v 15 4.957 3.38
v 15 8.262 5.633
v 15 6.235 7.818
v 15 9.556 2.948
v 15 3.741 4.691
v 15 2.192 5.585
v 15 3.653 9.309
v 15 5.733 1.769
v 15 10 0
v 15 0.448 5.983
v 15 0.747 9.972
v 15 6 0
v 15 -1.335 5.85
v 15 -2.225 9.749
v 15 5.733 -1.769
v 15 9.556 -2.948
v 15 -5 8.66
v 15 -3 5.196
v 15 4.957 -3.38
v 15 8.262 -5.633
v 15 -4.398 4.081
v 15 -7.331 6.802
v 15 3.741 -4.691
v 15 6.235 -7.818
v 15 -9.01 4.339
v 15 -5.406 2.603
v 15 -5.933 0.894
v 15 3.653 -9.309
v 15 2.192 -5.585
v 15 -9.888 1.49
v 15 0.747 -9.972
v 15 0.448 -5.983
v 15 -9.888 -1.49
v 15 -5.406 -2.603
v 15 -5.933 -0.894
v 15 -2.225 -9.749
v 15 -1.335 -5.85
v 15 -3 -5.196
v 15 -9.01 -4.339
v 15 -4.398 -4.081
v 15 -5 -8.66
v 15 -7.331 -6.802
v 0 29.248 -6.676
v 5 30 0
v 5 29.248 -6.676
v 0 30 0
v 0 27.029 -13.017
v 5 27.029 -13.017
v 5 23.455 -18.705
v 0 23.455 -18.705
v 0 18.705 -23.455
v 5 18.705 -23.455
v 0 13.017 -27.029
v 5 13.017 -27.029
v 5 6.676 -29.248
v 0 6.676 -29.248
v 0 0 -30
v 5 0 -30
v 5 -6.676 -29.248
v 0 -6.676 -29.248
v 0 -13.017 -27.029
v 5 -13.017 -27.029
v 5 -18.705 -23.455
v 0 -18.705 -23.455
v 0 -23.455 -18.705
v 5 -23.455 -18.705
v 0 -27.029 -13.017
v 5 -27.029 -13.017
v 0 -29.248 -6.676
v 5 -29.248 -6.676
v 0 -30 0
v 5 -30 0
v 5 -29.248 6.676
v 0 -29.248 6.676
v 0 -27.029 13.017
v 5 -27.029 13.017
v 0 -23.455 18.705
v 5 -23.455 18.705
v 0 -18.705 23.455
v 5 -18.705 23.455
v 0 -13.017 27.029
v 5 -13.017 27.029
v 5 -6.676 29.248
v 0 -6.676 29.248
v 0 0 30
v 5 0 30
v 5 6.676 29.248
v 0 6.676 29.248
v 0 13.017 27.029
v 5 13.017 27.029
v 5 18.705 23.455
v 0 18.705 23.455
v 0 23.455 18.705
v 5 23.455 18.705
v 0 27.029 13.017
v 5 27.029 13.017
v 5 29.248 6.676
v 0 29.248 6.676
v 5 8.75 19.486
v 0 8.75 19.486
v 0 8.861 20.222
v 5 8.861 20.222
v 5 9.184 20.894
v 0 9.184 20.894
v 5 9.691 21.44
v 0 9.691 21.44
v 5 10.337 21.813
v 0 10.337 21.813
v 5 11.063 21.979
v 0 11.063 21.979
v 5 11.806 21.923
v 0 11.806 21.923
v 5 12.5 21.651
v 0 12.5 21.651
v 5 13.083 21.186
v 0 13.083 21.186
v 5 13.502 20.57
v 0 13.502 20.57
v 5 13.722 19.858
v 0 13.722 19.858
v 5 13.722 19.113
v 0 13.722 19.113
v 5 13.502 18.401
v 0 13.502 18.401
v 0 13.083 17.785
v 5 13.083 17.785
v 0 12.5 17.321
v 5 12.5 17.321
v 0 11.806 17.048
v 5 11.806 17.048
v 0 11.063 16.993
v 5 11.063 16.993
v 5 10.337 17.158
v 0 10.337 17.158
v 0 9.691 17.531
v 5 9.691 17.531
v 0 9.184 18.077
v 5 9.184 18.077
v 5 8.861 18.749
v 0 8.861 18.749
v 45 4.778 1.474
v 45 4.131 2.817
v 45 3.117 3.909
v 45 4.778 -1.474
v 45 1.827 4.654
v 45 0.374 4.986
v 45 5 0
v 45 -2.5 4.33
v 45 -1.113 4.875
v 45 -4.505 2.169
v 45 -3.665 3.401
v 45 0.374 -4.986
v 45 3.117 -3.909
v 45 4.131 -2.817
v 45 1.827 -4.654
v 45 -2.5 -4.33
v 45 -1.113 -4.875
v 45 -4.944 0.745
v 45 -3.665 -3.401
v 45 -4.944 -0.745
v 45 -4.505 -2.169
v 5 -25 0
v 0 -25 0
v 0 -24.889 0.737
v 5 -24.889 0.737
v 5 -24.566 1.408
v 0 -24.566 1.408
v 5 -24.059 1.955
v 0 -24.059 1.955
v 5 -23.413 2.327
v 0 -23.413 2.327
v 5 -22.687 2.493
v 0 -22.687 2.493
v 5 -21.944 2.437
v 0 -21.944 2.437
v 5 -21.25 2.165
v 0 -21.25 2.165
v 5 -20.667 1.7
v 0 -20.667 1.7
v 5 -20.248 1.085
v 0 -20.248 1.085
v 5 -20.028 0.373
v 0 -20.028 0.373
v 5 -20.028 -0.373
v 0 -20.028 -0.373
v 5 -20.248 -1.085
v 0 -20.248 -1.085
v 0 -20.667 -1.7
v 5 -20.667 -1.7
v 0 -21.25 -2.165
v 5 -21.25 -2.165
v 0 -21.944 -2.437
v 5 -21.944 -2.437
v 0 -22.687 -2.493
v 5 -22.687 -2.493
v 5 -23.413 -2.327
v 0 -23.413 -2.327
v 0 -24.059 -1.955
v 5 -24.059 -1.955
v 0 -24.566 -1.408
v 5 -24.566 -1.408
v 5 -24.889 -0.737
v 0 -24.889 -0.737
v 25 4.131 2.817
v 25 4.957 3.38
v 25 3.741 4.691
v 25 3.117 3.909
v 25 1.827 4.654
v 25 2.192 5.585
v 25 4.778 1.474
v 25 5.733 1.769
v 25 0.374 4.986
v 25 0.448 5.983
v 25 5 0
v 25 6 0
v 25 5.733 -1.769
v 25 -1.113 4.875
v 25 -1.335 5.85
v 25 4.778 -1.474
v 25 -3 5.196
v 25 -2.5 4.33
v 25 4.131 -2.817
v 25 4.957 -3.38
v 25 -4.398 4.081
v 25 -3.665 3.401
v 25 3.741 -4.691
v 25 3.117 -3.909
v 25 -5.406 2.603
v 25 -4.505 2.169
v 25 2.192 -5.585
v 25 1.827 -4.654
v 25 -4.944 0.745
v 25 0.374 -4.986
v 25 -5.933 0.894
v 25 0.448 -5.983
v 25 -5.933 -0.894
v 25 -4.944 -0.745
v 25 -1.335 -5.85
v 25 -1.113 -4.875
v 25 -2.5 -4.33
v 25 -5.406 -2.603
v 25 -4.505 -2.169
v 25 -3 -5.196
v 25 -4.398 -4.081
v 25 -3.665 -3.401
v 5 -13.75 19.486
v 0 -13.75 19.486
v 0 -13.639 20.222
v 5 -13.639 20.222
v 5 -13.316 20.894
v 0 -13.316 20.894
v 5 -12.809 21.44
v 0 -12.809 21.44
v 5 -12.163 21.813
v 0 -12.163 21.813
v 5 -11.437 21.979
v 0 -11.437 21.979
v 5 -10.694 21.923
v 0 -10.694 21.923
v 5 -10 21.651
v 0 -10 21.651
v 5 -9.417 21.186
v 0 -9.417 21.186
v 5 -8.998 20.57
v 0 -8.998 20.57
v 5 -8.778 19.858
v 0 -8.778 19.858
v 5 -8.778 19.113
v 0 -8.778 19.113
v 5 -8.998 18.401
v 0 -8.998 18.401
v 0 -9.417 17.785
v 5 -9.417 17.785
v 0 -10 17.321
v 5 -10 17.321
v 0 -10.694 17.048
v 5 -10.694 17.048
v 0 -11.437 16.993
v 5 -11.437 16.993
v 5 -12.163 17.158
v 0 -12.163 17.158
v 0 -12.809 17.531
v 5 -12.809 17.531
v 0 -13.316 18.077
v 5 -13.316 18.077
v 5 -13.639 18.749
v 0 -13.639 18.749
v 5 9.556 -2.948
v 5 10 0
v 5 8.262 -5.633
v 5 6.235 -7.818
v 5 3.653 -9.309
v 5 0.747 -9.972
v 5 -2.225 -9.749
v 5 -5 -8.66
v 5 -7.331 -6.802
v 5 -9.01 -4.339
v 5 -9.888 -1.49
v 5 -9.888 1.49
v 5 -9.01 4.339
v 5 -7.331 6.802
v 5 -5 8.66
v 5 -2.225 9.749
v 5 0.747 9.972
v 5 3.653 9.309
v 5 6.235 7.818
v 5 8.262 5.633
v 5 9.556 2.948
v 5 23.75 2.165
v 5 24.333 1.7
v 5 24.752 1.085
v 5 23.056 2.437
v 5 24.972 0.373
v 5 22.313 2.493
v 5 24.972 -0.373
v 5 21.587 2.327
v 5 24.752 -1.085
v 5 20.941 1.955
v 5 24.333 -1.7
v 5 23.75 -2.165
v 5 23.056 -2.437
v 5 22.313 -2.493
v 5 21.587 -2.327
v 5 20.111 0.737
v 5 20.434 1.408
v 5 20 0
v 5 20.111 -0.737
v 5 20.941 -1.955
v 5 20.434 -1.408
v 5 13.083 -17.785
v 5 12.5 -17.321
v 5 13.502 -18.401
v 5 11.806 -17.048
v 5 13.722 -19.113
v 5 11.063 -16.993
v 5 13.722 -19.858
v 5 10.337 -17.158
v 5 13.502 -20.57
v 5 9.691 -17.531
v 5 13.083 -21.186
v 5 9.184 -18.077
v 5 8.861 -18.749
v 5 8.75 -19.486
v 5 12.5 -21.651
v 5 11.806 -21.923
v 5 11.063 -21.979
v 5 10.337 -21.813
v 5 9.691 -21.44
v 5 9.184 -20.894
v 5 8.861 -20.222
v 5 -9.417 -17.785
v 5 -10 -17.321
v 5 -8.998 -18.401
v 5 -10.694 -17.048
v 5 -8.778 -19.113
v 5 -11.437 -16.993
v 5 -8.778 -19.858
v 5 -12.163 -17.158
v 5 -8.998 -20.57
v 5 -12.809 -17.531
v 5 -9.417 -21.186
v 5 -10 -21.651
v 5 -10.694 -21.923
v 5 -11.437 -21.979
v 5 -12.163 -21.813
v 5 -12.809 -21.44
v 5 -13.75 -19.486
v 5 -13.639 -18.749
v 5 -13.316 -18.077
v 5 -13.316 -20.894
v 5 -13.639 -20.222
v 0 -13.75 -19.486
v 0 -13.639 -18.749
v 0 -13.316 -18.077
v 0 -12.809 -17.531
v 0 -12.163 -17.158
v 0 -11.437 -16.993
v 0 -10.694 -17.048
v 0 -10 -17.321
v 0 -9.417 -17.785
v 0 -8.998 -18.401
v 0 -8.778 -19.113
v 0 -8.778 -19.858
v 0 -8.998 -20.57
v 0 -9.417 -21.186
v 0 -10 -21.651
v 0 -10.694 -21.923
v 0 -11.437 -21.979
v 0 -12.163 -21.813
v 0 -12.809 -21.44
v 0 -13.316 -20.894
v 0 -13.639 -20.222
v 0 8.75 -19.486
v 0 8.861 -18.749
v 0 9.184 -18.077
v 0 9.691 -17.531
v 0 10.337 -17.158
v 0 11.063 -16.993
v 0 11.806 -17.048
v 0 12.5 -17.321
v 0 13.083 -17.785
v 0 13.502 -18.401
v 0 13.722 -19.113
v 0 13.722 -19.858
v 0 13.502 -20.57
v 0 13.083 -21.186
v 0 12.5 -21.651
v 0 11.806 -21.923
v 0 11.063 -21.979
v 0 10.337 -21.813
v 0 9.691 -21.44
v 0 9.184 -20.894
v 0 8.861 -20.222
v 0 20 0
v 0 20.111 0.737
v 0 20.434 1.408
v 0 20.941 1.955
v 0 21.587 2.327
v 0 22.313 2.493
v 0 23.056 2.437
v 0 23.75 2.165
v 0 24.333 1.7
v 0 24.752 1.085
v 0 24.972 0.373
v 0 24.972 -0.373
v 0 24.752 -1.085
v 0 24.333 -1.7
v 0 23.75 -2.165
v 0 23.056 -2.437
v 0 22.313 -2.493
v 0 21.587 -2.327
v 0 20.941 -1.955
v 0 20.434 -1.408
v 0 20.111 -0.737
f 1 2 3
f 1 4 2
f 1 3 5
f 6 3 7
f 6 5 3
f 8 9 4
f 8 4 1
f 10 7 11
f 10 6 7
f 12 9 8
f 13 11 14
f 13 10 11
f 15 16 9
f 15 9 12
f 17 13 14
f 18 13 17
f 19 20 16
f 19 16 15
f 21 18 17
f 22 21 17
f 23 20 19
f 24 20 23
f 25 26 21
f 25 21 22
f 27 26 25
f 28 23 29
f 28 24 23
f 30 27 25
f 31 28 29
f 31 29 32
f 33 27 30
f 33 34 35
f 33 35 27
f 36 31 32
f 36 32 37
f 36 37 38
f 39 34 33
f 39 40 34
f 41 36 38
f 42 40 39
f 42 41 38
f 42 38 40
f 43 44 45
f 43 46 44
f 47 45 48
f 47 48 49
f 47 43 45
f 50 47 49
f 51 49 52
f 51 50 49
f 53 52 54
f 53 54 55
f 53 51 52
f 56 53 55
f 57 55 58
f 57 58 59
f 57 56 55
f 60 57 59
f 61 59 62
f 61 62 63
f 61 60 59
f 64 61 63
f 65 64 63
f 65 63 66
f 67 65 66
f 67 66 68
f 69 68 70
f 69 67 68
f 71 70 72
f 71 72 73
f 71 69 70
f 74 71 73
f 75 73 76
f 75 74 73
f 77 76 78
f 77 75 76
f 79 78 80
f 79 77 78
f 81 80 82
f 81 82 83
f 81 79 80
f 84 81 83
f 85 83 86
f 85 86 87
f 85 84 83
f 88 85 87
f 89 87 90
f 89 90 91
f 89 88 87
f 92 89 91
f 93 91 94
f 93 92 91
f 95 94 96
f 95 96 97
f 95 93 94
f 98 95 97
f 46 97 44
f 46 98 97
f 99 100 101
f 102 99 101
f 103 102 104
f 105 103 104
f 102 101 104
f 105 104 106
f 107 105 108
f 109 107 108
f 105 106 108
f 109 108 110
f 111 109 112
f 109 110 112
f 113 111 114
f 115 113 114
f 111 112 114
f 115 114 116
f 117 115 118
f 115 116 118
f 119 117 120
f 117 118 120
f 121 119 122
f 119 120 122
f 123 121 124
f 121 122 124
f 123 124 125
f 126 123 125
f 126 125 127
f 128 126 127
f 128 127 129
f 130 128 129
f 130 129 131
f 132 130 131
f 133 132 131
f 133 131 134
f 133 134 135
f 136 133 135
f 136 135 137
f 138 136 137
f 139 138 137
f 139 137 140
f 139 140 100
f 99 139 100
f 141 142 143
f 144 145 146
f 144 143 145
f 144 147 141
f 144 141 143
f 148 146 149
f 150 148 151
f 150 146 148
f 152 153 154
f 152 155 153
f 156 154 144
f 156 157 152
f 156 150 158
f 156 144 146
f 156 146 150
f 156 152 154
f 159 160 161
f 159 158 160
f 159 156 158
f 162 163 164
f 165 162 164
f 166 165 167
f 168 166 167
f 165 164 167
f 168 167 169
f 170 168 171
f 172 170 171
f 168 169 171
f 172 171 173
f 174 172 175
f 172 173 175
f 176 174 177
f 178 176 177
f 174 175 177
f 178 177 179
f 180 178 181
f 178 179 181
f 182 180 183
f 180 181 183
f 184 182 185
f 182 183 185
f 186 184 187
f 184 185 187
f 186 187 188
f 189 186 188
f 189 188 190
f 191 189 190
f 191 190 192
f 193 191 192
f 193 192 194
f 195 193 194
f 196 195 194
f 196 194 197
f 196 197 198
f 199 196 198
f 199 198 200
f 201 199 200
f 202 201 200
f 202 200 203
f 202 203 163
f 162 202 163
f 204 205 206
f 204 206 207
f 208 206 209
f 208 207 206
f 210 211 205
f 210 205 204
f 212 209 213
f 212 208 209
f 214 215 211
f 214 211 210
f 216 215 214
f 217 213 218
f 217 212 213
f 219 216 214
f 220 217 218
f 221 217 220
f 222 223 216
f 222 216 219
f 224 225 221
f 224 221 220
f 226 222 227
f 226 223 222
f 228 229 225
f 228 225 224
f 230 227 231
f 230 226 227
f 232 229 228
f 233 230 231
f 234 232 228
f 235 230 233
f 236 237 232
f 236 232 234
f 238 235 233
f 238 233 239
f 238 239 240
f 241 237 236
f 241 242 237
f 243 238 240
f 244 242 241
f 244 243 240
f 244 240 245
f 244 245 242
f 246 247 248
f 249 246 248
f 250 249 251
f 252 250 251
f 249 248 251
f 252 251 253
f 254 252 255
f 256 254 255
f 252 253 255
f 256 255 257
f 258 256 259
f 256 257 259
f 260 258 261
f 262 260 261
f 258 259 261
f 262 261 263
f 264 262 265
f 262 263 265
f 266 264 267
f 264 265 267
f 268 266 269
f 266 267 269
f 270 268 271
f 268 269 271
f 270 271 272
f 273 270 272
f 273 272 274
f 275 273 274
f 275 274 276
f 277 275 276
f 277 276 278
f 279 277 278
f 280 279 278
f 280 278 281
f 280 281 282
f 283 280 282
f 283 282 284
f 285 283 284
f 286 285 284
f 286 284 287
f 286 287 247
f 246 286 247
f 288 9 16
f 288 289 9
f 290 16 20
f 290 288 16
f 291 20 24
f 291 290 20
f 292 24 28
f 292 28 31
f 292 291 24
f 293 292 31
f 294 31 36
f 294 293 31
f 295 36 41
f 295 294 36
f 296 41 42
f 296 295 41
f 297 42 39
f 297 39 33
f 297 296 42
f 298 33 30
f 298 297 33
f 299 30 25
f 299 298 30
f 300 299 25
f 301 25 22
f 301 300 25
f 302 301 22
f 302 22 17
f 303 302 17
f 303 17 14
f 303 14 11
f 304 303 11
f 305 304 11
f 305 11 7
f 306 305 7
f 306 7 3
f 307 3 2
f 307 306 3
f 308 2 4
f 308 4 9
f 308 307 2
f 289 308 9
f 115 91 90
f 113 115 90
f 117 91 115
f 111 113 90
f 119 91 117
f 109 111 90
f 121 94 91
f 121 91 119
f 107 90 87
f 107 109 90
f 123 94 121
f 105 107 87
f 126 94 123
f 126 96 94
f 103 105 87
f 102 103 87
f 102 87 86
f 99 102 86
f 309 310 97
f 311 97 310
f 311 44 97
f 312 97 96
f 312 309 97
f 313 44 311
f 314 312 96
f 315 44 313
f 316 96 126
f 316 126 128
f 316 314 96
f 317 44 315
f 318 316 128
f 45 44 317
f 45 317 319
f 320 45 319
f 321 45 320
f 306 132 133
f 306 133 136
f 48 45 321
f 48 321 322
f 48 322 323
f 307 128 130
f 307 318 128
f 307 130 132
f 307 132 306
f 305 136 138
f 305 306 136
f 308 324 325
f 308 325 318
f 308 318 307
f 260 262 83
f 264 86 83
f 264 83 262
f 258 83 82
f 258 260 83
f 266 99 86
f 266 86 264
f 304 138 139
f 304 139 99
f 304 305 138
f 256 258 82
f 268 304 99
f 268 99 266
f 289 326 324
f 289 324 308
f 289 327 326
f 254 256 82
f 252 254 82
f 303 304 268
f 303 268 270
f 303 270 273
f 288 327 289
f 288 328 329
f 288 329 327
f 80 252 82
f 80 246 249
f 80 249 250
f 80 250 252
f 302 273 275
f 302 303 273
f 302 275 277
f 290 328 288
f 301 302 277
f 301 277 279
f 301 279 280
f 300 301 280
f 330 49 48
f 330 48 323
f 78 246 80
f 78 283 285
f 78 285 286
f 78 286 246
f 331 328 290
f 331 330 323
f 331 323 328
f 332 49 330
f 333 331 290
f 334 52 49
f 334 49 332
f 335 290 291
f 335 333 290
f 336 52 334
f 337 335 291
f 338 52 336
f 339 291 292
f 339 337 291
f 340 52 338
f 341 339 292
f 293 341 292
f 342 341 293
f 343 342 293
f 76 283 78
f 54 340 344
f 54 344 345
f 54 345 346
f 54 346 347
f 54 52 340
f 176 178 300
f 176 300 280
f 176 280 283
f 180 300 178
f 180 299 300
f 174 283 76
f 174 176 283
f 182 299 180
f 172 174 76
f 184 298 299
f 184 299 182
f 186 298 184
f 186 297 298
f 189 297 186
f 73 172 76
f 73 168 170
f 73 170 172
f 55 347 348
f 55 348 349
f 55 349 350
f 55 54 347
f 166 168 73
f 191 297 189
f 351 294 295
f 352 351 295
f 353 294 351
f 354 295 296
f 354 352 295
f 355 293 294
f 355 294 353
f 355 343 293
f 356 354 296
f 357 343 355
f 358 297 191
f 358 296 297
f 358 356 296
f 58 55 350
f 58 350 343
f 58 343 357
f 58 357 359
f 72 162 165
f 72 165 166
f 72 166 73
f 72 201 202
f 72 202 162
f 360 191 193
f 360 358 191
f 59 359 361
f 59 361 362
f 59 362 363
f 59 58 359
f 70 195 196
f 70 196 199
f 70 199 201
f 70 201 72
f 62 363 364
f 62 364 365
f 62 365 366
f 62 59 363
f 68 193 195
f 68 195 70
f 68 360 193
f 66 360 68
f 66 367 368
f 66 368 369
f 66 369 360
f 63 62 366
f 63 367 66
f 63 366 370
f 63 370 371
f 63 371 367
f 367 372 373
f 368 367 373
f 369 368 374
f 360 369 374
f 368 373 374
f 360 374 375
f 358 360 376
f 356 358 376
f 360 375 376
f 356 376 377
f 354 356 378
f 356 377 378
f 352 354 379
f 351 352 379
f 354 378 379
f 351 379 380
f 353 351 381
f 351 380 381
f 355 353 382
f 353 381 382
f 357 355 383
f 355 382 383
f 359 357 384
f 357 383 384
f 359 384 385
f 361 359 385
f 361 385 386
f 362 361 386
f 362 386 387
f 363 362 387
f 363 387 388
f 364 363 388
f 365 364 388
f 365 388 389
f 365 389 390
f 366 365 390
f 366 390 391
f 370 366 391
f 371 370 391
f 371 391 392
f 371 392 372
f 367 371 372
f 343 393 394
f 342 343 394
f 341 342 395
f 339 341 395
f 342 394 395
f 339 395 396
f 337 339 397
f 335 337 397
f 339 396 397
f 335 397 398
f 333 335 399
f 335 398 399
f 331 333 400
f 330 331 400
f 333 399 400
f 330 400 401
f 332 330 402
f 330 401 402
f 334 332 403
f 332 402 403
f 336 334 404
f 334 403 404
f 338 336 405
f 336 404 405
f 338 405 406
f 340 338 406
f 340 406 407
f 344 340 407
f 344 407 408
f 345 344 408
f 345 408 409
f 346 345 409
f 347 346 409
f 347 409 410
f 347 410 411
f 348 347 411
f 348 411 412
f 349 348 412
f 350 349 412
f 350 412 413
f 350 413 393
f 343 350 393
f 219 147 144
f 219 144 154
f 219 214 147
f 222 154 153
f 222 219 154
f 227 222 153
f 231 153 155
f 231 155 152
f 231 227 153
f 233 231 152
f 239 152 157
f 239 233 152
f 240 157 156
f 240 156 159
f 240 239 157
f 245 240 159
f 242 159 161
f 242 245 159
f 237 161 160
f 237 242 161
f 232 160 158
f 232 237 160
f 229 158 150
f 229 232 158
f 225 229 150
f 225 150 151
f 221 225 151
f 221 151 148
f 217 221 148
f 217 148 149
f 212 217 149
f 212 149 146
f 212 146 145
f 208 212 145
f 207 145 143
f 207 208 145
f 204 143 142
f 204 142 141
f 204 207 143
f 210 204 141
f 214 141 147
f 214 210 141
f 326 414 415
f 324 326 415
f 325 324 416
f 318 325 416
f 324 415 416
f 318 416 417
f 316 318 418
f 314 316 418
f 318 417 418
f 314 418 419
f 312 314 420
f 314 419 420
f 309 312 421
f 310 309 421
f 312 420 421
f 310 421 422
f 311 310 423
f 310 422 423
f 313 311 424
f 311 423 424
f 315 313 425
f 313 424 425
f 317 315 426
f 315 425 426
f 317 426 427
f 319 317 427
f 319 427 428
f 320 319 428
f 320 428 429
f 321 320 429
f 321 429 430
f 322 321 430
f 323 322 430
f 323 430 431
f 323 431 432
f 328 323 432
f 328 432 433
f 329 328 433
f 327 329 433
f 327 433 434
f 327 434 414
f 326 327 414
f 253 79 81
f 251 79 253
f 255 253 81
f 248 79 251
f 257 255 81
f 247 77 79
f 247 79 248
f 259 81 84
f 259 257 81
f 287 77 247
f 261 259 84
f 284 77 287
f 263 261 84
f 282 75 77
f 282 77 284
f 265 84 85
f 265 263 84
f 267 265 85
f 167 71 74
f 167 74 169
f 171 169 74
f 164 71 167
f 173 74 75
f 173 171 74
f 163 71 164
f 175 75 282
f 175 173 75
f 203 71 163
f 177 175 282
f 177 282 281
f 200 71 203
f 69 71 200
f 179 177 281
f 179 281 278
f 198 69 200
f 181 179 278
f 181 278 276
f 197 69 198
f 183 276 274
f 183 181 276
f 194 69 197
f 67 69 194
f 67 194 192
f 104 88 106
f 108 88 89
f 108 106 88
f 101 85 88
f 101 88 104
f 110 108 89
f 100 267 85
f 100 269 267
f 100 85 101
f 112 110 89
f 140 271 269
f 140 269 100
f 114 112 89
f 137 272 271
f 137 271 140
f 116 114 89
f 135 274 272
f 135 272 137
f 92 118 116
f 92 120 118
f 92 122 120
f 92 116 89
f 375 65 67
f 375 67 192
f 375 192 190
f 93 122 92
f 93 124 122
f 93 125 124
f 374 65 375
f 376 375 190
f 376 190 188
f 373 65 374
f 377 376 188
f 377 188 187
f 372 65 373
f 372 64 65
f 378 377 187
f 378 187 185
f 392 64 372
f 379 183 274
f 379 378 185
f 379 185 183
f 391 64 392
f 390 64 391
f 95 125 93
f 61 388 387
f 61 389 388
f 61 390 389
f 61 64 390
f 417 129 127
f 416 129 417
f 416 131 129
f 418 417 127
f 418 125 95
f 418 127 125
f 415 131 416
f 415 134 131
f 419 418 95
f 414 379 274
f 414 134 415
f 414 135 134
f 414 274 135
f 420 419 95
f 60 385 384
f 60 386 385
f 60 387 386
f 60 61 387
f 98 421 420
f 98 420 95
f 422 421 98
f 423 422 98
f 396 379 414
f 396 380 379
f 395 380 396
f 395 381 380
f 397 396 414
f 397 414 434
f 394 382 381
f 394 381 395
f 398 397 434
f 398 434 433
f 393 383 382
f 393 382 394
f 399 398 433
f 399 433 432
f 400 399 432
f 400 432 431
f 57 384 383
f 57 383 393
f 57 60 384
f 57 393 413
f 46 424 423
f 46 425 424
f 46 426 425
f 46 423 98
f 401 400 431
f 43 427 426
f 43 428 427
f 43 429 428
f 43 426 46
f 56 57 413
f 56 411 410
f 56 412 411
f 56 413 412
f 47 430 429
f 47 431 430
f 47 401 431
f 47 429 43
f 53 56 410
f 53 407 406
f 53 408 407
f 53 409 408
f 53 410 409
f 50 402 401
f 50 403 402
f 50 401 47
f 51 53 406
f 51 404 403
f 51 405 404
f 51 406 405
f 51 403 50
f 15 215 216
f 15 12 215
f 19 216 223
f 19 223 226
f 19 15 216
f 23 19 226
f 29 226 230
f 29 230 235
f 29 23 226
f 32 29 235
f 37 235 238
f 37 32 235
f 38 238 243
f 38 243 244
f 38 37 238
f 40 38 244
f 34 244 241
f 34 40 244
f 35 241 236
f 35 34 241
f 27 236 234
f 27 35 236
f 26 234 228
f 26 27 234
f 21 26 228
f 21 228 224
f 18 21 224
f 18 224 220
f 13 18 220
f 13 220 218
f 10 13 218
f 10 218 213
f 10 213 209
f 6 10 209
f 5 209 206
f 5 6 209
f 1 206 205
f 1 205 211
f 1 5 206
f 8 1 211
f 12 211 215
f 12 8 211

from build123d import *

# Parameters (mm, degrees)
SKETCH_2_R          = 2.5
CUT_EXTRUDE_1_DEPTH = 62.846584384


with BuildPart() as part:
    # 草图1 → 旋转2 (revolve)
    with BuildSketch(Plane.XY):
        Polygon((0, 30), (0, 0), (45, 0), (45, 5), (25, 5), (25, 6), (15, 6), (15, 10), (5, 10), (5, 30), align=None)
    revolve(axis=Axis((45, 0, 0), (-1, 0, 0)))

    # 草图2 → 切除-拉伸1 (cut, through all)
    with BuildSketch(Plane.ZY):
        with Locations(Location((0, 22.5, 0), (0, 0, 270))):
            Circle(SKETCH_2_R)
        with Locations(Location((19.485571585, 11.25, 0), (0, 0, 270))):
            Circle(SKETCH_2_R)
        with Locations(Location((19.485571585, -11.25, 0), (0, 0, 270))):
            Circle(SKETCH_2_R)
        with Locations(Location((0, -22.5, 0), (0, 0, 270))):
            Circle(SKETCH_2_R)
        with Locations(Location((-19.485571585, -11.25, 0), (0, 0, 270))):
            Circle(SKETCH_2_R)
        with Locations(Location((-19.485571585, 11.25, 0), (0, 0, 270))):
            Circle(SKETCH_2_R)
    extrude(amount=-CUT_EXTRUDE_1_DEPTH, mode=Mode.SUBTRACT)


solid = part.part
